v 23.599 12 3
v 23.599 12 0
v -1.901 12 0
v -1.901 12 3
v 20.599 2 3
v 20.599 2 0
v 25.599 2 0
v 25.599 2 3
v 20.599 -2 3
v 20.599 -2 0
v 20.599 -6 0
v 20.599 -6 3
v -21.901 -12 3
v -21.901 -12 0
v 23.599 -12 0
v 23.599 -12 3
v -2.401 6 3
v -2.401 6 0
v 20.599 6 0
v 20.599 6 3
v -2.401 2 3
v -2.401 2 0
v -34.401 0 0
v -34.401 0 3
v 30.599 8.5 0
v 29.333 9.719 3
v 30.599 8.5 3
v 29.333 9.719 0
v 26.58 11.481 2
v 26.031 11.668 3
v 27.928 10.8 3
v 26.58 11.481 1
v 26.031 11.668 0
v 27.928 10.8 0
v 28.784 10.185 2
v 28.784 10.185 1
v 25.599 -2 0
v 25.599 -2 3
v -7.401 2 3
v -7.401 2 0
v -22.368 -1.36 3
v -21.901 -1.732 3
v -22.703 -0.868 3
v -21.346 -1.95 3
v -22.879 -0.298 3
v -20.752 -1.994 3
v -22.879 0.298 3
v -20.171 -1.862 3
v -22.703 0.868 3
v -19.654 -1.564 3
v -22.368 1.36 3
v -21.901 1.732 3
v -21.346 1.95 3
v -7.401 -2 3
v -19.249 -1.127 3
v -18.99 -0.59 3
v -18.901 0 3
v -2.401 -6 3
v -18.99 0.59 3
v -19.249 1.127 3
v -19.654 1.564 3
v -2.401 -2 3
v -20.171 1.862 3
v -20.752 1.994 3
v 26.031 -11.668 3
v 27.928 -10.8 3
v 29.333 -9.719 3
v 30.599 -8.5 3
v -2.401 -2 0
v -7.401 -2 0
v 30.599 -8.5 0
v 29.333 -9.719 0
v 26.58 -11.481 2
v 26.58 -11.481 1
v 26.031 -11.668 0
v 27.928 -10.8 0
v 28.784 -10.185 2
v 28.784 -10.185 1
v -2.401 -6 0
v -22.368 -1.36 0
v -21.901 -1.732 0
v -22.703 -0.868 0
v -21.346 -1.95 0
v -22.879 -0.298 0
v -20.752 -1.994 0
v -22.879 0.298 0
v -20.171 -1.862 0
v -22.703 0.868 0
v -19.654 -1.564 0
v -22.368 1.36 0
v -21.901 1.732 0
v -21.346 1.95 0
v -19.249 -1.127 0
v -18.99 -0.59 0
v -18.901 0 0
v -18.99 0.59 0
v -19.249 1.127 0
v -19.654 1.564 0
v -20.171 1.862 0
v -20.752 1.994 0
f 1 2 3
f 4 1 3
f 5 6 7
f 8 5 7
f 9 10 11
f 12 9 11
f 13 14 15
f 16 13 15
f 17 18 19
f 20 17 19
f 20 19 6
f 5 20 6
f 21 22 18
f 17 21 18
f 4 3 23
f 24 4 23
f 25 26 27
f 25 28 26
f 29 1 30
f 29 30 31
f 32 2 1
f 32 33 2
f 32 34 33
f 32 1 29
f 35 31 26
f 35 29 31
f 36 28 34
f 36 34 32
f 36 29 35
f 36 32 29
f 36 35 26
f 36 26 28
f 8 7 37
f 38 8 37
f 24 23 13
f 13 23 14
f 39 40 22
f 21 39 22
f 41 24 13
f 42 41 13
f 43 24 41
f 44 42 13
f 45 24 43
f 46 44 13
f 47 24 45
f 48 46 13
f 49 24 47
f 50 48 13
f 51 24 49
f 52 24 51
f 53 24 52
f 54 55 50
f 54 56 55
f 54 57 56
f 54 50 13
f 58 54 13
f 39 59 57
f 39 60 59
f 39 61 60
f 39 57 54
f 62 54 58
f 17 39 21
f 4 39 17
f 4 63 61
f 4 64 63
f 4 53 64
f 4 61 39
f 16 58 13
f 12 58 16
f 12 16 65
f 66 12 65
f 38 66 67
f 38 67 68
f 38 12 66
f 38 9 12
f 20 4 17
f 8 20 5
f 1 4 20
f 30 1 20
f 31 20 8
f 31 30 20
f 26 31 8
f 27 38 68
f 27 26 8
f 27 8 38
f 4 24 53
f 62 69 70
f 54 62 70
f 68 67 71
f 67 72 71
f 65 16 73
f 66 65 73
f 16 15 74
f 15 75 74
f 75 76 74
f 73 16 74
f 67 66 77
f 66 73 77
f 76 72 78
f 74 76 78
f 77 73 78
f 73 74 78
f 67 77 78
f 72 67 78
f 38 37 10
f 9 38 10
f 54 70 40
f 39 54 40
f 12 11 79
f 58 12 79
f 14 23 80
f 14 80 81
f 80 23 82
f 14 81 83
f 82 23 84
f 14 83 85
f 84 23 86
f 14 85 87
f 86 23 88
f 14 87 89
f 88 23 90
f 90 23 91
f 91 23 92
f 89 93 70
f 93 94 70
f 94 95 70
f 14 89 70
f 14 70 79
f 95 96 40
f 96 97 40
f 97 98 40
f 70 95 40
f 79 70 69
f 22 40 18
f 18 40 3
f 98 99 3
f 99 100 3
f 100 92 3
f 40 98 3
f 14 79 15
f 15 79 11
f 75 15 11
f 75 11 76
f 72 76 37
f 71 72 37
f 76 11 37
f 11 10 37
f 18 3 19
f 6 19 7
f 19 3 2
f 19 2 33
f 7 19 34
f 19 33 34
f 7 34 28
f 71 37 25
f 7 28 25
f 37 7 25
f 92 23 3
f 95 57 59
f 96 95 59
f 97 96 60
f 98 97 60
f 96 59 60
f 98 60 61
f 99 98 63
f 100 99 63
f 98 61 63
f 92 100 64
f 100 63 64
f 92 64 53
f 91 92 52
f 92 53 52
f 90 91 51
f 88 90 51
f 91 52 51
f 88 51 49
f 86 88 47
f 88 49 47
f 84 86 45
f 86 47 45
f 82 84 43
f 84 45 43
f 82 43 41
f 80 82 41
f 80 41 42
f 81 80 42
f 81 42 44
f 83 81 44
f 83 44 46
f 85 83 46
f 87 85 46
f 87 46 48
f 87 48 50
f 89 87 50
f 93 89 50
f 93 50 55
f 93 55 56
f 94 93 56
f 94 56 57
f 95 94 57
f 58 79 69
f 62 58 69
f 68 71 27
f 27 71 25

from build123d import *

# Parameters (mm, degrees)
BOSS_EXTRU_1_DEPTH = 3
SKETCH1_R          = 2
CUT_EXTRUDE1_DEPTH = 37.557629685


with BuildPart() as part:
    # Esquisse1 → Boss.-Extru.1 (new body)
    with BuildSketch(Plane.XY):
        with BuildLine():
            Line((-1.901457503, 12), (-34.401457503, 0))
            Line((-34.401457503, 0), (-21.901457503, -12))
            Line((-21.901457503, -12), (23.598542497, -12))
            add(Edge.make_bspline(
                [(23.598542497, -12), (27.098542497, -12), (28.848542497, -10.25), (30.598542497, -8.5)],
                knots=[0, 0, 0, 0, 0.5, 0.5, 0.5, 0.5], degree=3))
            Line((30.598542497, -8.5), (30.598542497, 8.5))
            add(Edge.make_bspline(
                [(23.598542497, 12), (27.098542497, 12), (28.848542497, 10.25), (30.598542497, 8.5)],
                knots=[0, 0, 0, 0, 0.5, 0.5, 0.5, 0.5], degree=3))
            Line((23.598542497, 12), (-1.901457503, 12))
        make_face()
        Polygon((-2.401457503, 2), (-2.401457503, 6), (20.598542497, 6), (20.598542497, 2), (25.598542497, 2), (25.598542497, -2), (20.598542497, -2), (20.598542497, -6), (-2.401457503, -6), (-2.401457503, -2), (-7.401457503, -2), (-7.401457503, 2), align=None, mode=Mode.SUBTRACT)
    extrude(amount=BOSS_EXTRU_1_DEPTH)

    # Sketch1 → Cut-Extrude1 (cut, through all)
    with BuildSketch(Plane.XY.offset(3)):
        with Locations((-20.901457503, 0)):
            Circle(SKETCH1_R)
    extrude(amount=-CUT_EXTRUDE1_DEPTH, mode=Mode.SUBTRACT)


solid = part.part
